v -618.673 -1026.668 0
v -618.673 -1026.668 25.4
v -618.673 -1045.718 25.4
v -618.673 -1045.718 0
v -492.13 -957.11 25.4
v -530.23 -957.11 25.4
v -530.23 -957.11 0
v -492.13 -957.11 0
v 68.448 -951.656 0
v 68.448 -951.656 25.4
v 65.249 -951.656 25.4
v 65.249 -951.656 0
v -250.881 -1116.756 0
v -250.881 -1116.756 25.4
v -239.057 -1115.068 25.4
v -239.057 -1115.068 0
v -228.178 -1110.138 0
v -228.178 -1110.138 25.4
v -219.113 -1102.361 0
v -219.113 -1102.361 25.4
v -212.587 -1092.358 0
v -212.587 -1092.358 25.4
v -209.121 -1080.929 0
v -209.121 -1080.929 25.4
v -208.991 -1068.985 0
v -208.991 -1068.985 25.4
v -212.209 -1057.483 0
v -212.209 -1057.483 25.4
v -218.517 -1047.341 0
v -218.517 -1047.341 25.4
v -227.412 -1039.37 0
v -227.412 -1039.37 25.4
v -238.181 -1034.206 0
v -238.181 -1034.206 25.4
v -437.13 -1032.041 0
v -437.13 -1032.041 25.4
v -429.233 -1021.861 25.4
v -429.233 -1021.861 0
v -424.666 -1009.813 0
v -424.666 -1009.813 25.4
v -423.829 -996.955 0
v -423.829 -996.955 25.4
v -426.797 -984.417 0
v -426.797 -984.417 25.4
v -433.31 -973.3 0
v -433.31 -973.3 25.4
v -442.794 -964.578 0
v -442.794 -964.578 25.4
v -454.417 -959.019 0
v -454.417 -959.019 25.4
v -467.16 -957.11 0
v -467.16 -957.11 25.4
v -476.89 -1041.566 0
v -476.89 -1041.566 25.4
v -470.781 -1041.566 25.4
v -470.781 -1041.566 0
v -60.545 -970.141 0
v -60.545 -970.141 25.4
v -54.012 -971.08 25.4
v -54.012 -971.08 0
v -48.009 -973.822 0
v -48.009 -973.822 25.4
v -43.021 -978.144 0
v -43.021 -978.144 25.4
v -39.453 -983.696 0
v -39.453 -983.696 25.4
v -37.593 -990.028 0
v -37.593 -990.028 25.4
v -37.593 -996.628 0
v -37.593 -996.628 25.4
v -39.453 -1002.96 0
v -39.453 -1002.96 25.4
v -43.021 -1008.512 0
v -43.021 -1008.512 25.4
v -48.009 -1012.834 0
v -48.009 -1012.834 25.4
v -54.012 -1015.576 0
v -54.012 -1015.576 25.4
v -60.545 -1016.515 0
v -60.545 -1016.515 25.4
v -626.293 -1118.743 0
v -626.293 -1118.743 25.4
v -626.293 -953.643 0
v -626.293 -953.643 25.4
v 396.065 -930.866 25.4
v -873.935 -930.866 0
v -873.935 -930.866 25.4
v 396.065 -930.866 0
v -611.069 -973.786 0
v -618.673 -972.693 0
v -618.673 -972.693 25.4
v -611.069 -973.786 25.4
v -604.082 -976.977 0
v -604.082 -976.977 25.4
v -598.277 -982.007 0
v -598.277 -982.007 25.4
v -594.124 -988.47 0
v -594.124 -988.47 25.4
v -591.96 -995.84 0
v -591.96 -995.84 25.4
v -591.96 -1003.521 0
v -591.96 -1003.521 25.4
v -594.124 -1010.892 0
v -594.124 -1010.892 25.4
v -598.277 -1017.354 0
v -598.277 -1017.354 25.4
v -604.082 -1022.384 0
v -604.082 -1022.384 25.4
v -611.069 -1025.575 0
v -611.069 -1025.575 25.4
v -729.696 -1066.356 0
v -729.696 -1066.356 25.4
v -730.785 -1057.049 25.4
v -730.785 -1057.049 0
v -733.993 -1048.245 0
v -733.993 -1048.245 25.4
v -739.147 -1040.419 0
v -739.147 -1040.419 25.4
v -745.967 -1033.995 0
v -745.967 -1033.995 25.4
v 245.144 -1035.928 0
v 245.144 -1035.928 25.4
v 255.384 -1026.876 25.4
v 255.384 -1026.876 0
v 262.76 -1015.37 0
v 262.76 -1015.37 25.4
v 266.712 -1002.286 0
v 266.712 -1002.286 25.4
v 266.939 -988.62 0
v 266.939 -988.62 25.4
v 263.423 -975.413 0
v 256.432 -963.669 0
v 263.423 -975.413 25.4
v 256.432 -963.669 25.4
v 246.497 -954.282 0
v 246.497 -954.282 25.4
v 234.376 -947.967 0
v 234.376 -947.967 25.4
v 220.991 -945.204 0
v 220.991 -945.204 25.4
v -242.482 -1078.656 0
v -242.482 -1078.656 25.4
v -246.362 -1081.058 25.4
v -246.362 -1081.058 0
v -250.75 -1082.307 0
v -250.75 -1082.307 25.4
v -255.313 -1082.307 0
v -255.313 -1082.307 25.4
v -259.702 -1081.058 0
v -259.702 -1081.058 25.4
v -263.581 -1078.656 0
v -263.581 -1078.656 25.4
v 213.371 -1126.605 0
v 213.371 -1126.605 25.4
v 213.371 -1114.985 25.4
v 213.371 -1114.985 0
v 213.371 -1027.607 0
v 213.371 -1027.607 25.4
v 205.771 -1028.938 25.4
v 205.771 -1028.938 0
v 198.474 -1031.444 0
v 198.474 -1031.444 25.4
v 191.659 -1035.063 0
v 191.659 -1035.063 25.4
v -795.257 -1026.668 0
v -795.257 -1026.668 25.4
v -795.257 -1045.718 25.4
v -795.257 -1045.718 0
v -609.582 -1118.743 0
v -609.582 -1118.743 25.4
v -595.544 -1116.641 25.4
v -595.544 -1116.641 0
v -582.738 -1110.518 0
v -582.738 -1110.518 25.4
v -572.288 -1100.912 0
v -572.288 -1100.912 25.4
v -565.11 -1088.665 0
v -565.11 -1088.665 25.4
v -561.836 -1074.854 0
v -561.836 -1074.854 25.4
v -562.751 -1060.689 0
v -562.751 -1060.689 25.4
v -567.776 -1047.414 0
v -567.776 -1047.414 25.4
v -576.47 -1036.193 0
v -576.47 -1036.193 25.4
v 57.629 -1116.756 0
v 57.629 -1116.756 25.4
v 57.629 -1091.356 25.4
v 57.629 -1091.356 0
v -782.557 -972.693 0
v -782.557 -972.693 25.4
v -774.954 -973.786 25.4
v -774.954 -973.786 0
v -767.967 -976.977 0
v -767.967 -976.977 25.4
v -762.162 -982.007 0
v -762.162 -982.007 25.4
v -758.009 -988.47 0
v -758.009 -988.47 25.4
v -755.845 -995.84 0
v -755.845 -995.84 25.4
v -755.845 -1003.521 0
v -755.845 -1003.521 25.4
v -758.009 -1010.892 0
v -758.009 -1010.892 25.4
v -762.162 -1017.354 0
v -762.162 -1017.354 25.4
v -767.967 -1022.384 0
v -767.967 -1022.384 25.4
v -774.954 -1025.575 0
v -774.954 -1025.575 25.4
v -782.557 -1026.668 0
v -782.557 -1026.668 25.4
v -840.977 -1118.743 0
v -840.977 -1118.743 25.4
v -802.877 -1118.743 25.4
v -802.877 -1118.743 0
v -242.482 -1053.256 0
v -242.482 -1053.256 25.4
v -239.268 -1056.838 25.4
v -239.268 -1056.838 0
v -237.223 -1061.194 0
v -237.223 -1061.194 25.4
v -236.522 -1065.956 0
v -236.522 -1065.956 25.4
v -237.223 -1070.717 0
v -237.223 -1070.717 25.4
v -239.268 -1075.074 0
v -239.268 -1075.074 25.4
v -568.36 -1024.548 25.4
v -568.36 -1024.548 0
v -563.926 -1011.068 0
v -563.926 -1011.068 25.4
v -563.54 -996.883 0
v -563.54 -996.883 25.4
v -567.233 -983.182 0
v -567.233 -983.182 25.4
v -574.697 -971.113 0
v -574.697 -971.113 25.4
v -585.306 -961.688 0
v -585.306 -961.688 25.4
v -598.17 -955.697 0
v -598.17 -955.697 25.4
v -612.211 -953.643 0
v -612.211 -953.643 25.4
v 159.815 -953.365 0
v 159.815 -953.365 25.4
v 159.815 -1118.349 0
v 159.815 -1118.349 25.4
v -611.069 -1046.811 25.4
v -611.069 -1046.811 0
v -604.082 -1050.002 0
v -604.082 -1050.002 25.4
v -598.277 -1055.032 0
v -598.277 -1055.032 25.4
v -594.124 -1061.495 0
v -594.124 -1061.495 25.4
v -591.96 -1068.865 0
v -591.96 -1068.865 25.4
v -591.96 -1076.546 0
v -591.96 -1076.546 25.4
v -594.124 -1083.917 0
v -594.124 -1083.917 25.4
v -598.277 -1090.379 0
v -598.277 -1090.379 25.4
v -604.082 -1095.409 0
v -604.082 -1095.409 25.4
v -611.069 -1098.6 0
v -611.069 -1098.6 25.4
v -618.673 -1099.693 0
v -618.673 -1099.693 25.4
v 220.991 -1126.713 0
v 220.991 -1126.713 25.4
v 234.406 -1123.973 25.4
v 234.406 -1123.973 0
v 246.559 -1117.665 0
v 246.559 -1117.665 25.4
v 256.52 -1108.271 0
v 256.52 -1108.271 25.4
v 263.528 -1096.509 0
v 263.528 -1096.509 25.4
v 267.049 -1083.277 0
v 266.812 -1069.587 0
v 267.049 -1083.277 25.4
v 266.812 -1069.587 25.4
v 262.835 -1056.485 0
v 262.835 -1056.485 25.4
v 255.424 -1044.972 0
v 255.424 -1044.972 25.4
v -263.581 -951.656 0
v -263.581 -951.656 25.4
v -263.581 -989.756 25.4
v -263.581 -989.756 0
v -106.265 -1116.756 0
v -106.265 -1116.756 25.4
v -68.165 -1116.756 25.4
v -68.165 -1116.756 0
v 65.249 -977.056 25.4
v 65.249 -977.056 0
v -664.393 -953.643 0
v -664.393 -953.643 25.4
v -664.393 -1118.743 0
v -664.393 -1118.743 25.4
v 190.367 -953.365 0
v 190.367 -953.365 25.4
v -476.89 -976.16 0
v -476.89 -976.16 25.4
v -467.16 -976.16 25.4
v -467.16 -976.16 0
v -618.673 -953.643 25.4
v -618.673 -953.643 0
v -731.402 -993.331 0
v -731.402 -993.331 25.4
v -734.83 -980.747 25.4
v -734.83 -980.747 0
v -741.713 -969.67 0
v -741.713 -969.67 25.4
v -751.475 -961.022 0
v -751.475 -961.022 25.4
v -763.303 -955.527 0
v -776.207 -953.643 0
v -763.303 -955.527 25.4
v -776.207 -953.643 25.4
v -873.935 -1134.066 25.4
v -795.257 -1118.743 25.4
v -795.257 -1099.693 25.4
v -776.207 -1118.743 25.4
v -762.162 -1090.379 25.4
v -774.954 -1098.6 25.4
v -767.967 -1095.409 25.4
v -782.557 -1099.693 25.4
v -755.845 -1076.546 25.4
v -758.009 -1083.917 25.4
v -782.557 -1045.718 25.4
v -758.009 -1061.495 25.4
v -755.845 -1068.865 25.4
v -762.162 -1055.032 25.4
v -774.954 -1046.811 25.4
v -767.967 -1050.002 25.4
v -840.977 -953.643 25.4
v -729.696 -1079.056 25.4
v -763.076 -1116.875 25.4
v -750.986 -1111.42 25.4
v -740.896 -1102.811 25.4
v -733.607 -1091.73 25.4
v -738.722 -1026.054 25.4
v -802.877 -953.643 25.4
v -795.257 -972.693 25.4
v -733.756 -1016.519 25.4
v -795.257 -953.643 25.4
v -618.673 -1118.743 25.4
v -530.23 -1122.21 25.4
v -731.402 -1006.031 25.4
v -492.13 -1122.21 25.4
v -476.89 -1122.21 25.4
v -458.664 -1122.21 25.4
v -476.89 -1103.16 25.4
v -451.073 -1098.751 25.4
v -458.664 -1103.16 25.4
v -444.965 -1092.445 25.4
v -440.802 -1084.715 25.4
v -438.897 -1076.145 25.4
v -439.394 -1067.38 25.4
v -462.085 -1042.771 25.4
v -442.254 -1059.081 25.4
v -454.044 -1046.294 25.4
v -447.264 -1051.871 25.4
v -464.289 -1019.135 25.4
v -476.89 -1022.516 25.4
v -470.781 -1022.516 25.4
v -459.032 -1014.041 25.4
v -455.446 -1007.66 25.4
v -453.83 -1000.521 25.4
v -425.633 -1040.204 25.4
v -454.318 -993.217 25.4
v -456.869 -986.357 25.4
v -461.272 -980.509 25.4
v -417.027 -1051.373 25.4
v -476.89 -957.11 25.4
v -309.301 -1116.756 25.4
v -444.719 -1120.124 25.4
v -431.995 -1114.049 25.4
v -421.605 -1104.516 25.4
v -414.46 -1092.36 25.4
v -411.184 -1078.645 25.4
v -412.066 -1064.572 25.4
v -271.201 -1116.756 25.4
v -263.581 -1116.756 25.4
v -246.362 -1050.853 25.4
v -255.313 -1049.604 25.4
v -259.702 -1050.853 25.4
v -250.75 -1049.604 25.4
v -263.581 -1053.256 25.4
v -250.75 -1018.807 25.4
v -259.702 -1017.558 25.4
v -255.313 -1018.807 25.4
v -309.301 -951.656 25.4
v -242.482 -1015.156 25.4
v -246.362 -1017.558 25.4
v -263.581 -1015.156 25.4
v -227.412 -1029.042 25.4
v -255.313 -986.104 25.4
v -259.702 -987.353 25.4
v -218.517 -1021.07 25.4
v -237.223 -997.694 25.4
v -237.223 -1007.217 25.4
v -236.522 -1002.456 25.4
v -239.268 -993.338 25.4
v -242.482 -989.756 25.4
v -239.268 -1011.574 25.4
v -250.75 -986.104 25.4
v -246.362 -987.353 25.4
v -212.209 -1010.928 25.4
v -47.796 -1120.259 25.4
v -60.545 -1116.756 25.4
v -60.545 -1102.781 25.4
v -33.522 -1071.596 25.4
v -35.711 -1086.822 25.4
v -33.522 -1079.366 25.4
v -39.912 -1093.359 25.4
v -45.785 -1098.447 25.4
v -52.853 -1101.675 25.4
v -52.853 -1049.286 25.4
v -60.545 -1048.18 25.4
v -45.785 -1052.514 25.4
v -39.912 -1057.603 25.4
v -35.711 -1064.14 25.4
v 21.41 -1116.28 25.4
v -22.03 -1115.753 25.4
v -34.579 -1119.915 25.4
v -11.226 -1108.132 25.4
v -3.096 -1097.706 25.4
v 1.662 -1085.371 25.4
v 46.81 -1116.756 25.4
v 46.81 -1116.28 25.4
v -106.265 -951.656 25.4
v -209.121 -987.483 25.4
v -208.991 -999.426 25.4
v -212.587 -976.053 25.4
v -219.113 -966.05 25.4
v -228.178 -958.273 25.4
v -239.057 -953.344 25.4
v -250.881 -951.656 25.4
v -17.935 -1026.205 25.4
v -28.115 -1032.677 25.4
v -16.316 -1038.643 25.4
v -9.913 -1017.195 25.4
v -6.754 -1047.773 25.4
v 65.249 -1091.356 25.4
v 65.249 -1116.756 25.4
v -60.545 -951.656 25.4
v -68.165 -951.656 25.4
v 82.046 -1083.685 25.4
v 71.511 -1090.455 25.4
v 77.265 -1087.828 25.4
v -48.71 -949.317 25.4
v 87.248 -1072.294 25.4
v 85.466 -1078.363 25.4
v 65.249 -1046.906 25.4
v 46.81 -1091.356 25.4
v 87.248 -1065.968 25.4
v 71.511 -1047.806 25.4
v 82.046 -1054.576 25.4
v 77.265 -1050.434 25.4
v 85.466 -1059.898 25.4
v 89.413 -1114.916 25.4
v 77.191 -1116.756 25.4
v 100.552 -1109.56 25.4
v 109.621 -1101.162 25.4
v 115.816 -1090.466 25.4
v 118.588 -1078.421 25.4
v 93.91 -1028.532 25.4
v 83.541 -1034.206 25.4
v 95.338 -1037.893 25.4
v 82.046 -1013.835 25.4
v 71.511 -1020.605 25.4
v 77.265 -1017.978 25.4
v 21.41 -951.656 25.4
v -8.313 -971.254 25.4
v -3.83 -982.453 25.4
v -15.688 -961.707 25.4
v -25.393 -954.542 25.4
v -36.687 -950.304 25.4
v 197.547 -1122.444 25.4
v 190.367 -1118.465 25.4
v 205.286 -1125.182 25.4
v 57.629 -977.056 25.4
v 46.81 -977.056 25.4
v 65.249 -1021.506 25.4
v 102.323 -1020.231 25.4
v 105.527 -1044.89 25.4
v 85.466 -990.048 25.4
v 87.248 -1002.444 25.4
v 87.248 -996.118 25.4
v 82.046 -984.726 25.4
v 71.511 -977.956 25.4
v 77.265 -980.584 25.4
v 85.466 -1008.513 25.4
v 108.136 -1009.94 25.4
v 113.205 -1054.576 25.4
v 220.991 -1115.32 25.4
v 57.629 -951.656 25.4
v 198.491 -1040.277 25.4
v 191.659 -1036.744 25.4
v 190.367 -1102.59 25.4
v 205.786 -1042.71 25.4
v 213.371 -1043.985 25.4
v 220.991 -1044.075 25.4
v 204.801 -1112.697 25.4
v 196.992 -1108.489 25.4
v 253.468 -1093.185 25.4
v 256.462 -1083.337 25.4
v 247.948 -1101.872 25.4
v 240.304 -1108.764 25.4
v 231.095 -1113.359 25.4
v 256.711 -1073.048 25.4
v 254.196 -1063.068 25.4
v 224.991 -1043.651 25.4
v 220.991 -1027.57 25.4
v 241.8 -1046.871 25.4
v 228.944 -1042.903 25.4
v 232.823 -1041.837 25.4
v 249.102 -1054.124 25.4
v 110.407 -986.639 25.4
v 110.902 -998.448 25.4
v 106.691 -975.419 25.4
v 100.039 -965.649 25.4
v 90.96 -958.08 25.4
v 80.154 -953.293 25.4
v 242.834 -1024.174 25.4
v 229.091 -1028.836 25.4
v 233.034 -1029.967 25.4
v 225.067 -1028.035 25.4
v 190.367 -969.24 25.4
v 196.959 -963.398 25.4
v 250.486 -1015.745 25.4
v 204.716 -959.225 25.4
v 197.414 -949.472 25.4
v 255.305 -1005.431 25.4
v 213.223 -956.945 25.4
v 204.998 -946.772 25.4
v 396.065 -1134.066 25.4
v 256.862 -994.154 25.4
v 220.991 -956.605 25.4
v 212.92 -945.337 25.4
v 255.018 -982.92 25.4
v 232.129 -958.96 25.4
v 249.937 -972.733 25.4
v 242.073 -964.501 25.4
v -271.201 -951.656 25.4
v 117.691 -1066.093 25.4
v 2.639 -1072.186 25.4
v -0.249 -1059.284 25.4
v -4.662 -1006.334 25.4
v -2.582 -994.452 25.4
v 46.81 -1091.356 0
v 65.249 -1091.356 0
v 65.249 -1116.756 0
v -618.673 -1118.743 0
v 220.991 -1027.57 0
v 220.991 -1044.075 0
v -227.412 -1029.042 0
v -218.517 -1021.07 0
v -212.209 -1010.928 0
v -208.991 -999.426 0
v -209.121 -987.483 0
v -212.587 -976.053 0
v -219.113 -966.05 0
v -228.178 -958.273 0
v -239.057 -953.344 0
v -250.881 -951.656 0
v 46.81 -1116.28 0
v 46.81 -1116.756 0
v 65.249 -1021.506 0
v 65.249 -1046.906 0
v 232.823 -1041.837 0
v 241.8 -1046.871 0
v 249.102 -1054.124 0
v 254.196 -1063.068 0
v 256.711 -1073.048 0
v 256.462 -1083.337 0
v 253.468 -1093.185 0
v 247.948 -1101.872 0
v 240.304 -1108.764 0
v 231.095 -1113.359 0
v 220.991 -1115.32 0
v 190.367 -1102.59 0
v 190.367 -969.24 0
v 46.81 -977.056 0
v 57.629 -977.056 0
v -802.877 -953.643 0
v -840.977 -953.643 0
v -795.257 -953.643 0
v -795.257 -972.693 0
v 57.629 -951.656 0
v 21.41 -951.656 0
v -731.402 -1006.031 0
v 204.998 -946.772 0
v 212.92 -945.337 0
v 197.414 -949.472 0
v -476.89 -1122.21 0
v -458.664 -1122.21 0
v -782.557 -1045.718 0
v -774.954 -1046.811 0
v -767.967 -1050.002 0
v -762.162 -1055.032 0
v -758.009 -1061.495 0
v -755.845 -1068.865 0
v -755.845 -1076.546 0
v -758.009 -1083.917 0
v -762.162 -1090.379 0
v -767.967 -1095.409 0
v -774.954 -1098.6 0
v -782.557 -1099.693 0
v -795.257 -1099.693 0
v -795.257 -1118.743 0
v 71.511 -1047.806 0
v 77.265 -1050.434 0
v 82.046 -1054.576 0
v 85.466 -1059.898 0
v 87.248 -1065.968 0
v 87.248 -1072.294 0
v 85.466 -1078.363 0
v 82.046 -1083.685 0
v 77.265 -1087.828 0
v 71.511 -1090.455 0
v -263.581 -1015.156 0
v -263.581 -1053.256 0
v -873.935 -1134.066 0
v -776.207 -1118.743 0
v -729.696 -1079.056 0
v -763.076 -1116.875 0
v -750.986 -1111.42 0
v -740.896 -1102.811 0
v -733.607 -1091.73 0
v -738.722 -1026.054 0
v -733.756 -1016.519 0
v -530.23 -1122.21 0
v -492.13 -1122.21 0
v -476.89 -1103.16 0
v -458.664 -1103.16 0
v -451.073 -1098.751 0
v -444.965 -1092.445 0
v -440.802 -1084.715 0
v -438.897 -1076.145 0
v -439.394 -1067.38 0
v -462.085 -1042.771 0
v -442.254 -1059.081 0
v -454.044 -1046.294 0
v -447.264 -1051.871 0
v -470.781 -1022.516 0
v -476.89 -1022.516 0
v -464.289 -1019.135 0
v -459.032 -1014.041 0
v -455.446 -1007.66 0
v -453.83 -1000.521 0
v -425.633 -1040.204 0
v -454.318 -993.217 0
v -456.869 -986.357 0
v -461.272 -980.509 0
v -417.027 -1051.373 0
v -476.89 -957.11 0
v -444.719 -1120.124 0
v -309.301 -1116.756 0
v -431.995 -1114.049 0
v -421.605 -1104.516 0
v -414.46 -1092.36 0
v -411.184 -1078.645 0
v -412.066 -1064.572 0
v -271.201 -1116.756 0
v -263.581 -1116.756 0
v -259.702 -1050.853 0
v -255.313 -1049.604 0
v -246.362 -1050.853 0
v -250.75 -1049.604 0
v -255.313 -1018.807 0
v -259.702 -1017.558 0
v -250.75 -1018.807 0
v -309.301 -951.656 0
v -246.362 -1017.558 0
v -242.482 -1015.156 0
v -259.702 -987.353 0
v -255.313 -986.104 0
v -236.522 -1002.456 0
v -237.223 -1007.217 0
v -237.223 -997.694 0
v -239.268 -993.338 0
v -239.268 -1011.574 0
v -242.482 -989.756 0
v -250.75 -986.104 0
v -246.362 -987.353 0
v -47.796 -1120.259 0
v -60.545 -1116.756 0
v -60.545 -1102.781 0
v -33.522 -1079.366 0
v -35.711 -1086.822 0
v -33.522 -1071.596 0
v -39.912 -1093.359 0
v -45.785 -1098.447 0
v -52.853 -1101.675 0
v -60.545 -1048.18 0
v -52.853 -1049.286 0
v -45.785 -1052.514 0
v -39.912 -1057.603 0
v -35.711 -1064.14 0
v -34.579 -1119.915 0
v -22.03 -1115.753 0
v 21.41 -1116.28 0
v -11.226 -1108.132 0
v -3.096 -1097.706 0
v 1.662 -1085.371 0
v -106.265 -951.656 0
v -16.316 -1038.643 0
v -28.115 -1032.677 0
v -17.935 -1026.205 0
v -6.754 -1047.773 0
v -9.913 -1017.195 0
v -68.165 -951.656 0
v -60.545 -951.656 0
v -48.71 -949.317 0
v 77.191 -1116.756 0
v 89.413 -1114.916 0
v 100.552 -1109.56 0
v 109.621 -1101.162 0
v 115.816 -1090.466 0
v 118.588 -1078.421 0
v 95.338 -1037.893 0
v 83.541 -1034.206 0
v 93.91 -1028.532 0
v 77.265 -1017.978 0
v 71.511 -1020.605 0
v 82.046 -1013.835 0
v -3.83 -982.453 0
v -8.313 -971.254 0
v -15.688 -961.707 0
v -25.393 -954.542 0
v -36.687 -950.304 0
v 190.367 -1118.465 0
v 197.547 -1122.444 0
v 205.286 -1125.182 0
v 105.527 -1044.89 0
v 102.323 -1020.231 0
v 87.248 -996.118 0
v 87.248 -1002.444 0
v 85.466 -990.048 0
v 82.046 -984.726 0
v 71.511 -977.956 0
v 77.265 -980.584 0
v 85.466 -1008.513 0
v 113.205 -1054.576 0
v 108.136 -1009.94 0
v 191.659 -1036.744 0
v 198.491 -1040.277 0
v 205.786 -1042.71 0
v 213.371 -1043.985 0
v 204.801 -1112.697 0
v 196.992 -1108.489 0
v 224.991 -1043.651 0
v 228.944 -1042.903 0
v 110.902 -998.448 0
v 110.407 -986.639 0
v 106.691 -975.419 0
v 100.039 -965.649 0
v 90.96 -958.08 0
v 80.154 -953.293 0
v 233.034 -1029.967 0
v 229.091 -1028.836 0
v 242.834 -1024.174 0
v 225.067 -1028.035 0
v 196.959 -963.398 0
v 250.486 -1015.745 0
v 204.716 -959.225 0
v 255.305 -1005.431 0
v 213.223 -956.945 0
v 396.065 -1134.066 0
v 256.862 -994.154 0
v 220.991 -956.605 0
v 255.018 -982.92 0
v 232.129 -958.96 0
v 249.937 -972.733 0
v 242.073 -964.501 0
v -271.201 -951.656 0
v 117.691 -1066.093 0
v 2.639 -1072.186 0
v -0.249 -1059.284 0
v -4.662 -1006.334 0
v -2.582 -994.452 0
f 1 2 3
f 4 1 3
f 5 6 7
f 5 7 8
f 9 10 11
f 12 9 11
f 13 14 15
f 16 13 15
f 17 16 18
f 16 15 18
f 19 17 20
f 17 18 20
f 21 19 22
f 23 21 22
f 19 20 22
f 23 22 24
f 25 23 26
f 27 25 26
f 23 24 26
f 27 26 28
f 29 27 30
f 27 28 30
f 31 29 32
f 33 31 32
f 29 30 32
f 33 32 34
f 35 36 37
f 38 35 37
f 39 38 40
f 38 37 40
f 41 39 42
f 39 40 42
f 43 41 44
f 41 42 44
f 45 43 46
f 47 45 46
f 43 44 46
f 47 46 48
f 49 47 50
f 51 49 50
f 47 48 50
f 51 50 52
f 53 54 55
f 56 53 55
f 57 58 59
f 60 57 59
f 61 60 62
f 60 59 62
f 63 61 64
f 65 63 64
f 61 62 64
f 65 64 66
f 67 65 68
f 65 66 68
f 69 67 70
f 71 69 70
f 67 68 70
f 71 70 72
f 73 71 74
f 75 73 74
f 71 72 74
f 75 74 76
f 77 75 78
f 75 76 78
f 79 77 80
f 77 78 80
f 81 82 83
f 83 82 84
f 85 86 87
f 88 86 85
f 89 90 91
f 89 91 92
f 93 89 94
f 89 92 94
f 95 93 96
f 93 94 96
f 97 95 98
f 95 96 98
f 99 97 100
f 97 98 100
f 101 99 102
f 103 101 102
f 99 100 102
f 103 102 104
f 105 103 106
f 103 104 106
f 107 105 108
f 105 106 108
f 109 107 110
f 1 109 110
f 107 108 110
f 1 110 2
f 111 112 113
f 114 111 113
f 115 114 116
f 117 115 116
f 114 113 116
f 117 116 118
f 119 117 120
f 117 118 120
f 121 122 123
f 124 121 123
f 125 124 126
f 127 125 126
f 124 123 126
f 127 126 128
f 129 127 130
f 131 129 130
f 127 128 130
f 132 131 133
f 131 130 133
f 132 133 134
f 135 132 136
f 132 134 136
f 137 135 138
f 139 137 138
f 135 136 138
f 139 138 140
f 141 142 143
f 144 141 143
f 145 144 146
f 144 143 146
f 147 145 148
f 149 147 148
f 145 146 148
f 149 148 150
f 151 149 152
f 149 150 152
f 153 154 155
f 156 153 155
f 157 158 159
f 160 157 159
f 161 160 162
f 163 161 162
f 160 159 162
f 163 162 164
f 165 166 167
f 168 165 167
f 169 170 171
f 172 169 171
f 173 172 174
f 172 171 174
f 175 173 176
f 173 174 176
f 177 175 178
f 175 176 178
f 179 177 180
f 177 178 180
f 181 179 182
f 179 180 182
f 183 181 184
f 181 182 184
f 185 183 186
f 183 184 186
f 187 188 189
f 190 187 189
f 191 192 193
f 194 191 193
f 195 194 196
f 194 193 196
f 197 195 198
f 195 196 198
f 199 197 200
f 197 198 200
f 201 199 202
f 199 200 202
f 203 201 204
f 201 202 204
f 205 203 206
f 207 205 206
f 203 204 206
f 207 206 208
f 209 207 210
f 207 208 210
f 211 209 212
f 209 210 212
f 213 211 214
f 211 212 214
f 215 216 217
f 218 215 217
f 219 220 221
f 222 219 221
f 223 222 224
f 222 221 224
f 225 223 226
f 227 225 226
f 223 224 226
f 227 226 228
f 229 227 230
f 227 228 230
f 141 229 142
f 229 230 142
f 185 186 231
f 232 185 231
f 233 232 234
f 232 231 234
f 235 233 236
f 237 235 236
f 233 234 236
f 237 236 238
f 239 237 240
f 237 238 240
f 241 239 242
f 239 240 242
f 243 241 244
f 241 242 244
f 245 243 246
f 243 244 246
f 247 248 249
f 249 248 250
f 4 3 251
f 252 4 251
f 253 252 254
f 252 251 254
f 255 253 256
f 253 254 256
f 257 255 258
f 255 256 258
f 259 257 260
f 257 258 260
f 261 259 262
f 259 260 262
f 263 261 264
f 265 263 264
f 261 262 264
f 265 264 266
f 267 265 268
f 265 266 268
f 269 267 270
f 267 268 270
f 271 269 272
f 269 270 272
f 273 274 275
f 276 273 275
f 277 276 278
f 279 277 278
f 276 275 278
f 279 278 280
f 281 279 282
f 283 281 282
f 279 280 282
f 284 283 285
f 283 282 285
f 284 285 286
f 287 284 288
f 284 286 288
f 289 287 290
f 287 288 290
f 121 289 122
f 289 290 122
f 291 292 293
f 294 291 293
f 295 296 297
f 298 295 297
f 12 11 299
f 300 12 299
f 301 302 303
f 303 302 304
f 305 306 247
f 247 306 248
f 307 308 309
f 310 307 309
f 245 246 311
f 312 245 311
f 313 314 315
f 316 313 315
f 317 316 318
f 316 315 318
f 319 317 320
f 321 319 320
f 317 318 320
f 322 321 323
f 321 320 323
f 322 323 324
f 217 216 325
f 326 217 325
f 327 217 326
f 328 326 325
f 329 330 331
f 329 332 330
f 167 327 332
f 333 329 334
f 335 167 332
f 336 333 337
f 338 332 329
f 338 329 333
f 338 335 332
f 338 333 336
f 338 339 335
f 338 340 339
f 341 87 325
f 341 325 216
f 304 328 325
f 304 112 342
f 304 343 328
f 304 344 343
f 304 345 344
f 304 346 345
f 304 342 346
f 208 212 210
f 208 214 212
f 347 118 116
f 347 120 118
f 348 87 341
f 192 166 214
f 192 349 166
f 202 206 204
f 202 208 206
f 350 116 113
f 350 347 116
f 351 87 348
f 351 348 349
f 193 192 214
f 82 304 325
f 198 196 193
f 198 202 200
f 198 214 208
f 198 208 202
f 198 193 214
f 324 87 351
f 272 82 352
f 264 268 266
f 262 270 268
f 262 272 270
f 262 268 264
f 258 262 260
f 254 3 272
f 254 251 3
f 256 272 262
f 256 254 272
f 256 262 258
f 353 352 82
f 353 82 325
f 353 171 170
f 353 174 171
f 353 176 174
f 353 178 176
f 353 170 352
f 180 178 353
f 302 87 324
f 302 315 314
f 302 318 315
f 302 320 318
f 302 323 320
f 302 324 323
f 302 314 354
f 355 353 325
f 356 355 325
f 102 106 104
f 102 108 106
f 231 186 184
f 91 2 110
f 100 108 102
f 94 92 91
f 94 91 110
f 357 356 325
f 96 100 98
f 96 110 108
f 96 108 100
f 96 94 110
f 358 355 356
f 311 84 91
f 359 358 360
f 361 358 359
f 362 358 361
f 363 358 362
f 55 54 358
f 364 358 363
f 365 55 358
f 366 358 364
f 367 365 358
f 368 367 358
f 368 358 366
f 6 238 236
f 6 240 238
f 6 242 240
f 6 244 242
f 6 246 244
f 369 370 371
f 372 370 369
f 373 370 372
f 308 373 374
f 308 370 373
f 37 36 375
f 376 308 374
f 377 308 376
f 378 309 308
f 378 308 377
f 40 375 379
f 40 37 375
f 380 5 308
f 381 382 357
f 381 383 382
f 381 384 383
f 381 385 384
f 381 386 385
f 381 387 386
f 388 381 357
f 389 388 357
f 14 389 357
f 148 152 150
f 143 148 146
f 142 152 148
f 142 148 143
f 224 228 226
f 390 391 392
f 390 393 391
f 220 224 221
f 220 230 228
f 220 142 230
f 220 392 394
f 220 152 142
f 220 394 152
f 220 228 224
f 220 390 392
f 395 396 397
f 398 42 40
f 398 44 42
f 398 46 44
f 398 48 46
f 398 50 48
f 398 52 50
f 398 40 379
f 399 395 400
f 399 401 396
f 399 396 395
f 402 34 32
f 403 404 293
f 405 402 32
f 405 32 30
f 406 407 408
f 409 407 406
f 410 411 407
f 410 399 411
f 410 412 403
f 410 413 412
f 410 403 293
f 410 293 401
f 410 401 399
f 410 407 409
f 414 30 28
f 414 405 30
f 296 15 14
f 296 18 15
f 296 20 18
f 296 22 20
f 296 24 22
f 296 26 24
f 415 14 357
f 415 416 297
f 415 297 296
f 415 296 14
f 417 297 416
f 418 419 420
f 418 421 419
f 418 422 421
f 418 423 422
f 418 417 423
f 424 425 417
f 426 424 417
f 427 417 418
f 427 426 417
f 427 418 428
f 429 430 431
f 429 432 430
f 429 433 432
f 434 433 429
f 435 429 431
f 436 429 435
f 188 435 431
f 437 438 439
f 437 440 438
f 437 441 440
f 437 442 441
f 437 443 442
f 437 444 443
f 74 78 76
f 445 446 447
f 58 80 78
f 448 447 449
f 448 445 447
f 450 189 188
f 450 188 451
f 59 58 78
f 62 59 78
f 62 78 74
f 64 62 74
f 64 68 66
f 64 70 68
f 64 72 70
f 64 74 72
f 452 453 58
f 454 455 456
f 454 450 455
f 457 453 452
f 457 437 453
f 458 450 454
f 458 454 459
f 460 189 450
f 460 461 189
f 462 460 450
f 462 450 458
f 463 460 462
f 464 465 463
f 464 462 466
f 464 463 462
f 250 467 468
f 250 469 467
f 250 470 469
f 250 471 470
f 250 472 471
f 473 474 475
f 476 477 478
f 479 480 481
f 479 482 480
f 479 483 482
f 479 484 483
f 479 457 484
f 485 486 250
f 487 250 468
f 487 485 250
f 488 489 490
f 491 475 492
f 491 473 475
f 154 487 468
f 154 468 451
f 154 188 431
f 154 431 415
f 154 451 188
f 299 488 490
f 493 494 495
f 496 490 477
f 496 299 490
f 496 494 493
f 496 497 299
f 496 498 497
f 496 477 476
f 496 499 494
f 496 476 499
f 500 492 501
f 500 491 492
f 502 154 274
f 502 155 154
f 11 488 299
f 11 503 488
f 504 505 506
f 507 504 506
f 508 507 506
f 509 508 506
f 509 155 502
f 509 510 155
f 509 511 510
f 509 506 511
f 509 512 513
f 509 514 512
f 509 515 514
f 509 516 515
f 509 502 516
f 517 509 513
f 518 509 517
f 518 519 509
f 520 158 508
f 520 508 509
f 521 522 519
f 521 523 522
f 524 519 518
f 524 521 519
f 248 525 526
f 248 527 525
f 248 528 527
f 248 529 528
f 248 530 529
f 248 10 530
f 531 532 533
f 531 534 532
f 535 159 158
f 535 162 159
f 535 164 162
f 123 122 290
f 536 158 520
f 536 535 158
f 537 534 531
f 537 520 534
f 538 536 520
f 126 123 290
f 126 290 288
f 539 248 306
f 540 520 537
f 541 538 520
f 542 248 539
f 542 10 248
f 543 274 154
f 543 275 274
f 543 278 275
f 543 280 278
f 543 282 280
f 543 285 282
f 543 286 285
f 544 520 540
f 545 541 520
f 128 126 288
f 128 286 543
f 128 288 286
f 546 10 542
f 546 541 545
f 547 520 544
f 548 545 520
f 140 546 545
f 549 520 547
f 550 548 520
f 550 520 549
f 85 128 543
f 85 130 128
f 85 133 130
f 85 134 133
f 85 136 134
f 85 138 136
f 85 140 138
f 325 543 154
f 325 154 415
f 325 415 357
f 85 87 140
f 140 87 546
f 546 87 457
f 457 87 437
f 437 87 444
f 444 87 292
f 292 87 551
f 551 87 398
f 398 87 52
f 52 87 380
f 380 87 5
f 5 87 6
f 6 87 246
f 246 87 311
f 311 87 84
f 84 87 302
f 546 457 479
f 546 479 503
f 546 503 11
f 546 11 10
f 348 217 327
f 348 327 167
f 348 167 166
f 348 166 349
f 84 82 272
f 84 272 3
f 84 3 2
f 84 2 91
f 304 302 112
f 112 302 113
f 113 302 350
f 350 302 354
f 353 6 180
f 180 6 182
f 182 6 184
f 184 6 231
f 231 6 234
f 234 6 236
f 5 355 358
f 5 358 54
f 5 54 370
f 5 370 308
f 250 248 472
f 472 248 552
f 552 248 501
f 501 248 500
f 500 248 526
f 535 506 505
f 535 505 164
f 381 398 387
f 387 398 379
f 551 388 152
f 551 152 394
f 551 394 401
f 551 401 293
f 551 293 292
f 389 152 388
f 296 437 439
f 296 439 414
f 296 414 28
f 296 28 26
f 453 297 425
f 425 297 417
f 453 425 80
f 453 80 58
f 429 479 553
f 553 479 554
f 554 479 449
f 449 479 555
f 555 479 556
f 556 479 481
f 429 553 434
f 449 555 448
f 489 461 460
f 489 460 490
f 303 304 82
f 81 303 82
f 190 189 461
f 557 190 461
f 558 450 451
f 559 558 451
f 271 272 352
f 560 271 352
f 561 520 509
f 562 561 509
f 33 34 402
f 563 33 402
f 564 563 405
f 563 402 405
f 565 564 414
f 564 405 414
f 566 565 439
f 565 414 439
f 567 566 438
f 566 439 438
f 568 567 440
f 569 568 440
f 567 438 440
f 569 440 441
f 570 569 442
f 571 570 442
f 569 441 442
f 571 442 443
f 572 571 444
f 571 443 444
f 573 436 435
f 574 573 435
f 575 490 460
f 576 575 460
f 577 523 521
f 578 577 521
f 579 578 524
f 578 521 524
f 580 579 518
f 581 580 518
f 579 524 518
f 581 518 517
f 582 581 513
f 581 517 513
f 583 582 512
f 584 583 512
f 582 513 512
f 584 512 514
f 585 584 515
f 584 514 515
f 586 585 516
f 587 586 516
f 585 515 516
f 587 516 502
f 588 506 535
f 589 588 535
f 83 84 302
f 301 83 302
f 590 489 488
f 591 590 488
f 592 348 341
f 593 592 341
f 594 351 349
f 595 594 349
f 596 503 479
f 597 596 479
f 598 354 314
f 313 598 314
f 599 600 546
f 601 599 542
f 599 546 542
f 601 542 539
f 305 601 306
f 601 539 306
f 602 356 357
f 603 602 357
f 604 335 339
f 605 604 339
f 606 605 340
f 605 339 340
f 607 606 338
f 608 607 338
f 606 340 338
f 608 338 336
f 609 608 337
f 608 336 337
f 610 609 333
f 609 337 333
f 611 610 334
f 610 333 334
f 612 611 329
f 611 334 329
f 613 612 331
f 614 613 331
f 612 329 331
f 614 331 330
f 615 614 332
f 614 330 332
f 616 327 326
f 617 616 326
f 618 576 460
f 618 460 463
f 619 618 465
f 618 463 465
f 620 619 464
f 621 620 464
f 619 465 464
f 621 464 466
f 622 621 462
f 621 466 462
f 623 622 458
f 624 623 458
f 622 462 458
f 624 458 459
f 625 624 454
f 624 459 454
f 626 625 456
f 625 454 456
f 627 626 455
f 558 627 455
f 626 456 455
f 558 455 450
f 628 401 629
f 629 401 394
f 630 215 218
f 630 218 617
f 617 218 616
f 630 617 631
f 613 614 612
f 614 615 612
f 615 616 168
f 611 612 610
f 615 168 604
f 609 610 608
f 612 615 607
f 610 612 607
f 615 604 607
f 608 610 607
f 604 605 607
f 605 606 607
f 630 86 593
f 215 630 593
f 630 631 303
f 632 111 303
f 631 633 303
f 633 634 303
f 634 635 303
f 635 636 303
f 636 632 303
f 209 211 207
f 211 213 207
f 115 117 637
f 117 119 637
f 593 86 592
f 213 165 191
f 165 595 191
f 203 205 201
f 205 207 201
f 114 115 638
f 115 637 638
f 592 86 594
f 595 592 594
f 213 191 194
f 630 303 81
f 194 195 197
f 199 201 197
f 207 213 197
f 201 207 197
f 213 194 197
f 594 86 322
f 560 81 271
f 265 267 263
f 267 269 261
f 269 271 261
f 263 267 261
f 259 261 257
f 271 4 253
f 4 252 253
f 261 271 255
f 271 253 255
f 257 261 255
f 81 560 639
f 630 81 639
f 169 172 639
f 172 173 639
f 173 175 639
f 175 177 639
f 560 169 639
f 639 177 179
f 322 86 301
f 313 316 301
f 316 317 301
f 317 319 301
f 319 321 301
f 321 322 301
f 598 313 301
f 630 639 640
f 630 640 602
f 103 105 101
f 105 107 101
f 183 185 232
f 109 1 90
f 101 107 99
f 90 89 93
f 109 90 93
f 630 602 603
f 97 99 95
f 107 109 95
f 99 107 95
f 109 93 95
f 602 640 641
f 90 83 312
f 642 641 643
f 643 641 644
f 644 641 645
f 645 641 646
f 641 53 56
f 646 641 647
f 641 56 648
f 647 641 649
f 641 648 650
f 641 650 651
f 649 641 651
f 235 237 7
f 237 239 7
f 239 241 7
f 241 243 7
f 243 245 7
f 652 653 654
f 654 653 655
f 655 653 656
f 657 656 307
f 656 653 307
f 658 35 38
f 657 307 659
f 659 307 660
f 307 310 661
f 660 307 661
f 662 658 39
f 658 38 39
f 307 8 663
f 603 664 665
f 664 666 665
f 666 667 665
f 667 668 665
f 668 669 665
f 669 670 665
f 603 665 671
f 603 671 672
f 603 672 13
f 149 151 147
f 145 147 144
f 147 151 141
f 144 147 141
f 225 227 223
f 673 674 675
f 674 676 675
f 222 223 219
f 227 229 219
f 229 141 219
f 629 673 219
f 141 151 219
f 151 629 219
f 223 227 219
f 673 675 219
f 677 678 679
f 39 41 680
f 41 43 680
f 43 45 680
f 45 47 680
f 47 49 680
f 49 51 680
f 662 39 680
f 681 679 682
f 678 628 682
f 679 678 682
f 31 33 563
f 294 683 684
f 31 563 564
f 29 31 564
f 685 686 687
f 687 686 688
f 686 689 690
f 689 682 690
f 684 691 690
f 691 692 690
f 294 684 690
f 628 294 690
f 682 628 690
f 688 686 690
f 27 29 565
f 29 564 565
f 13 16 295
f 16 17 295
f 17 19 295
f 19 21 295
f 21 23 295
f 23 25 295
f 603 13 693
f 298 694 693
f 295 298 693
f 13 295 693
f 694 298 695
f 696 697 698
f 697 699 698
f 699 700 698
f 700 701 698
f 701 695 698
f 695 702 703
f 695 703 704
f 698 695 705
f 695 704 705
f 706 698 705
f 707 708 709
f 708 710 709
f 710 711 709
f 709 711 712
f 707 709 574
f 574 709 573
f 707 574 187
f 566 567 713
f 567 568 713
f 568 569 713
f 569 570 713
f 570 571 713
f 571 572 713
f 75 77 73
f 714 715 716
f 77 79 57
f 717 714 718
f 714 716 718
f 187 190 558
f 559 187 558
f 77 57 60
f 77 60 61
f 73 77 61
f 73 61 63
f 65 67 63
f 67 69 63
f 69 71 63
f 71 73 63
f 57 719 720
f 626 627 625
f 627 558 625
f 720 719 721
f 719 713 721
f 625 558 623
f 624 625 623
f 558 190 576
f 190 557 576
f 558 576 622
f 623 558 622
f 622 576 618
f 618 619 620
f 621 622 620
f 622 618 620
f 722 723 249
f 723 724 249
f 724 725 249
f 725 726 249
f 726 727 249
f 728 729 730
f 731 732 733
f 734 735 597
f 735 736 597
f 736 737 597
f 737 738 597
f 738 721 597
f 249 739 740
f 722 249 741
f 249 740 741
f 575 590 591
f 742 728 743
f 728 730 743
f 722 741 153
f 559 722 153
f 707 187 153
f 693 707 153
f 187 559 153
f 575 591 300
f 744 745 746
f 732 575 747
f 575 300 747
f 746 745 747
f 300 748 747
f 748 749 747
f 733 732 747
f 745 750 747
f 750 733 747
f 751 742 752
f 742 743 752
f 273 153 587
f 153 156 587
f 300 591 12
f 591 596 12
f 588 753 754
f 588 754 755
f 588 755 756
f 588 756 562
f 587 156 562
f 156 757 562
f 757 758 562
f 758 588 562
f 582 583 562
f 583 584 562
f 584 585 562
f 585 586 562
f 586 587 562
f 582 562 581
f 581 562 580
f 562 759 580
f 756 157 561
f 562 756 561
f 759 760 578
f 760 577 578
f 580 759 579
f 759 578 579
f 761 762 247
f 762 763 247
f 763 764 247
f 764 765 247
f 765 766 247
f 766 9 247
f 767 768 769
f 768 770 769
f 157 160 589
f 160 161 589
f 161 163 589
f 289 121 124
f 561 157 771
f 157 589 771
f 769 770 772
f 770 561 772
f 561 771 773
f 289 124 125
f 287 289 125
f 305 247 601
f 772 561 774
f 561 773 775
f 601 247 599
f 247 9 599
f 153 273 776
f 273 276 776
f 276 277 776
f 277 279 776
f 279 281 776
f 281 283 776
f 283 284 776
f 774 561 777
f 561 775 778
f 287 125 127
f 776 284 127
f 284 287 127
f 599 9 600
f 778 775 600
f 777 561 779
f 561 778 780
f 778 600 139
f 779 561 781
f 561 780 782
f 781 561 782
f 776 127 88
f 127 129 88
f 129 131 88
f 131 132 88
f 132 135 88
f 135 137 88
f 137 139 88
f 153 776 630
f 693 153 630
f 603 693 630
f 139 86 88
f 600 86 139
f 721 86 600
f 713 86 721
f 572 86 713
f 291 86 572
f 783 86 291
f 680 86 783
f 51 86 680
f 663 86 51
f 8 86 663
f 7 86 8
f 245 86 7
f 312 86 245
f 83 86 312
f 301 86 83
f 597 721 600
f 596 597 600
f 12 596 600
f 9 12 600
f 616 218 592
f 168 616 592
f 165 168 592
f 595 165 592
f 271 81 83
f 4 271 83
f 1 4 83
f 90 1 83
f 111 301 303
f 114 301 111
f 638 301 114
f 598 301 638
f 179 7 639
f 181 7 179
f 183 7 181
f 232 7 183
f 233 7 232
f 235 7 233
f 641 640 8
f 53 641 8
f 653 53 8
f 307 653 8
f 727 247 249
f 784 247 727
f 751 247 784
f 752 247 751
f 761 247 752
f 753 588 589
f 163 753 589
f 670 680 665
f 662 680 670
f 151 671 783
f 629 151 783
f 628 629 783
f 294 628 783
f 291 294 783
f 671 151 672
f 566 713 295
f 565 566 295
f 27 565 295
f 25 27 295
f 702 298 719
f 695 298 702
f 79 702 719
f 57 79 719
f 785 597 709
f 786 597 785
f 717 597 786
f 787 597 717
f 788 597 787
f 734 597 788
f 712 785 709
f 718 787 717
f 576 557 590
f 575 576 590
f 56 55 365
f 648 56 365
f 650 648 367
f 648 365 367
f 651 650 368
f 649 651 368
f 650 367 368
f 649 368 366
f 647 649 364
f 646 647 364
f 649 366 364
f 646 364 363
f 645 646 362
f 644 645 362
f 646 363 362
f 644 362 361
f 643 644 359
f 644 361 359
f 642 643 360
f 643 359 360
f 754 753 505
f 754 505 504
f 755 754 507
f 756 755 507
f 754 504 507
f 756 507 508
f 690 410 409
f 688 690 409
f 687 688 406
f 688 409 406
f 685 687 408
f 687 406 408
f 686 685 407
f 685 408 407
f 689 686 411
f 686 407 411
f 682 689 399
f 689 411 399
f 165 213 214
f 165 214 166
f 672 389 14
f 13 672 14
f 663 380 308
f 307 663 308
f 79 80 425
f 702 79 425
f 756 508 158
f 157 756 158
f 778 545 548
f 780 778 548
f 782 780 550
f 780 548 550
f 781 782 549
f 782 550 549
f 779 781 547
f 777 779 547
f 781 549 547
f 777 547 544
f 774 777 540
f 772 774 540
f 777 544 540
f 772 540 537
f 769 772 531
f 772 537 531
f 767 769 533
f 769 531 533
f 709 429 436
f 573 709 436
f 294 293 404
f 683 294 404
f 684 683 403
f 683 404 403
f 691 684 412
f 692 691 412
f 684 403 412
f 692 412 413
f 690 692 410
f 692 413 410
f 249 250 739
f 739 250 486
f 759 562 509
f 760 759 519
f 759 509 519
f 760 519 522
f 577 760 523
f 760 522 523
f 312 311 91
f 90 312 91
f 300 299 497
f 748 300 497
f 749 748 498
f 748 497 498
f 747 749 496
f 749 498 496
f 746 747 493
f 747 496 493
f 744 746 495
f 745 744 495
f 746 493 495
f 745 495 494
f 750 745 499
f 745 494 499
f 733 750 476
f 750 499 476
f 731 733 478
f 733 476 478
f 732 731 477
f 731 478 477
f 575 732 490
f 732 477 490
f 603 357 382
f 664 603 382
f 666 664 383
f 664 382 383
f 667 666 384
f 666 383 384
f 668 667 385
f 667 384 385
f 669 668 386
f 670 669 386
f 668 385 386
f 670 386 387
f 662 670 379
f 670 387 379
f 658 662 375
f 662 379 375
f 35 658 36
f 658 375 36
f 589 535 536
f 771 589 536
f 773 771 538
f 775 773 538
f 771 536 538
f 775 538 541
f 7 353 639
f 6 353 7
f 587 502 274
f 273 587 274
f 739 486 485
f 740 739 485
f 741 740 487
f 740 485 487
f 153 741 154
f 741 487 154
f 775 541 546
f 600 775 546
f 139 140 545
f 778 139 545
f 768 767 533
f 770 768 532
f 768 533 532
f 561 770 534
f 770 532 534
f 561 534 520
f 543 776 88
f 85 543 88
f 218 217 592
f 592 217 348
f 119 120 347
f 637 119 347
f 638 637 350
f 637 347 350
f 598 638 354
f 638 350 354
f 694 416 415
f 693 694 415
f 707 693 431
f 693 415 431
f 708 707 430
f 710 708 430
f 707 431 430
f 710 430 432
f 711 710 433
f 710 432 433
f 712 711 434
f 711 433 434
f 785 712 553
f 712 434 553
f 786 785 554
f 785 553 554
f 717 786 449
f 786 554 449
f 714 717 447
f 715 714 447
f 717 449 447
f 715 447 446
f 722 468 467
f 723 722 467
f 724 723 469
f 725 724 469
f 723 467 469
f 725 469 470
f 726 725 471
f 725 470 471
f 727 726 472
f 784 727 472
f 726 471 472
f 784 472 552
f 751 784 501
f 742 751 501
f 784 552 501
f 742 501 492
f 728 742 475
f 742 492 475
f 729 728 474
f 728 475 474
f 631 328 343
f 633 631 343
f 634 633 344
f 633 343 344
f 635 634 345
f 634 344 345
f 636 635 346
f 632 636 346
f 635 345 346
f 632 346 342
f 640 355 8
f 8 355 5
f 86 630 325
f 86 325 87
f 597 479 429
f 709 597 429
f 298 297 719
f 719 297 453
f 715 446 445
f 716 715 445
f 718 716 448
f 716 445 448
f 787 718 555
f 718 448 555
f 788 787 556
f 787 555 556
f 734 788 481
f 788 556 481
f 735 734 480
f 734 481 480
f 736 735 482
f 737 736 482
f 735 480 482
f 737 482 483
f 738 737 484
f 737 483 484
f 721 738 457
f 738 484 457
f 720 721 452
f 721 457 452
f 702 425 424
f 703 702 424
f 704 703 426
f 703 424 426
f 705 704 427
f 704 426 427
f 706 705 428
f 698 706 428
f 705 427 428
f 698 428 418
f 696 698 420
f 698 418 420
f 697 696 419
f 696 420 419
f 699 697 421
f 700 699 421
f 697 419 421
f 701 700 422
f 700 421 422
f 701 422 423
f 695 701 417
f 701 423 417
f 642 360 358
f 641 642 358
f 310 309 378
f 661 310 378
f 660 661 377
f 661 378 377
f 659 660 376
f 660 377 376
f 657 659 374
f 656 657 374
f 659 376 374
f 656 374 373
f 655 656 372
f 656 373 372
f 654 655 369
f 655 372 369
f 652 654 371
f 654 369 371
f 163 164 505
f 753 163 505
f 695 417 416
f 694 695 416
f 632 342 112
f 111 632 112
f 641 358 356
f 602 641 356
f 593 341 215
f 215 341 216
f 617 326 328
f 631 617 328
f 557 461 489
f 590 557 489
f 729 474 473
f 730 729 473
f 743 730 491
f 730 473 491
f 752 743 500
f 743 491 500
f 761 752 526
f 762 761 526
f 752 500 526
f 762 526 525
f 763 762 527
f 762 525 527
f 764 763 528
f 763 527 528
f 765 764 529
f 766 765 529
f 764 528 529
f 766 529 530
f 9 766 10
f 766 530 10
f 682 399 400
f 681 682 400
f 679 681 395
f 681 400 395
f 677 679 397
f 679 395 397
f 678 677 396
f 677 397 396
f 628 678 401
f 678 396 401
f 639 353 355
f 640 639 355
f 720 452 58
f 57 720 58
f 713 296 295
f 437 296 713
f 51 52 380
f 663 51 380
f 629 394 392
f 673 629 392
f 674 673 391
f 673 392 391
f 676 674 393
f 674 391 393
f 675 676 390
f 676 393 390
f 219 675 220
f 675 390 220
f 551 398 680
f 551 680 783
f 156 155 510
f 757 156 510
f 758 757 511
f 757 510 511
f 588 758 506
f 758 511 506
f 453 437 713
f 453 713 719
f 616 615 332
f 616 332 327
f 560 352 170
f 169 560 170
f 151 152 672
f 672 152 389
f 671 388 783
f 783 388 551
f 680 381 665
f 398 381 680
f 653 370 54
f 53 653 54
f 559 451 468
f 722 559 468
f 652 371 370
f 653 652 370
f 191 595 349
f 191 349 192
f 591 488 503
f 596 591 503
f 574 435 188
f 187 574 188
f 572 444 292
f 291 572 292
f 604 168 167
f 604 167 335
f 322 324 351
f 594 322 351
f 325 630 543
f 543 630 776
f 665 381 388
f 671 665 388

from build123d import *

# Parameters (mm, degrees)
F0_W      = 1270
F0_H      = 203.2
F1_DEPTH  = 25.4
F3_DEPTH  = 25.4
F5_DEPTH  = 25.4
F6_W      = 38.1
F6_H      = 165.1
F7_DEPTH  = 25.4
F8_W      = 38.1
F8_H      = 165.1
F9_DEPTH  = 25.4
F10_W     = 38.1
F10_H     = 165.1
F11_DEPTH = 25.4
F12_W     = 10.8188445342
F12_H     = 25.4
F13_DEPTH = 25.4
F15_DEPTH = 25.4


# Not quite as in the source:
# - a feature names something its author has since deleted; it is built from what else it names


with BuildPart() as f1:
    # F0 (on Top) → F1 (new body)
    with BuildSketch(Plane.XY):
        with Locations((-238.9351708174, -1032.4661802616)):
            Rectangle(F0_W, F0_H)
    extrude(amount=F1_DEPTH)

    # F2 (on face) → F3 (cut)
    with BuildSketch(Plane.XY.offset(25.4)):
        Polygon((-802.8773658486, -953.6430131912), (-840.9773658486, -953.6430131912), (-840.9773658486, -1118.7430131912), (-802.8773658486, -1118.7430131912), (-802.8773658486, -1036.1930131912), align=None)
        with BuildLine():
            Line((-795.2573658486, -1026.6680131912), (-795.2573658486, -1034.9226884847))
            ThreePointArc((-795.2573658486, -1034.9226884847), (-770.7707510059, -1026.0470401418), (-745.9674756926, -1033.9949312892))
            ThreePointArc((-745.9674756926, -1033.9949312892), (-735.9296714012, -1021.4477610393), (-731.4022587776, -1006.0305131912))
            Line((-731.4022587776, -1006.0305131912), (-731.4022587776, -993.3305131912))
            ThreePointArc((-731.4022587776, -993.3305131912), (-746.2799733966, -964.9916145085), (-776.2073658486, -953.6430131912))
            Line((-776.2073658486, -953.6430131912), (-795.2573658486, -953.6430131912))
            Line((-795.2573658486, -953.6430131912), (-795.2573658486, -972.6930131912))
            Line((-795.2573658486, -972.6930131912), (-782.5573658486, -972.6930131912))
            ThreePointArc((-782.5573658486, -972.6930131912), (-755.5698658486, -999.6805131912), (-782.5573658486, -1026.6680131912))
            Line((-782.5573658486, -1026.6680131912), (-795.2573658486, -1026.6680131912))
        make_face()
        with BuildLine():
            ThreePointArc((-745.9674756926, -1033.9949312892), (-770.0833121416, -1043.7192190255), (-795.2573658486, -1037.2075096056))
            Line((-795.2573658486, -1037.2075096056), (-795.2573658486, -1045.7180131912))
            Line((-795.2573658486, -1045.7180131912), (-782.5573658486, -1045.7180131912))
            ThreePointArc((-782.5573658486, -1045.7180131912), (-755.5698658486, -1072.7055131912), (-782.5573658486, -1099.6930131912))
            Line((-782.5573658486, -1099.6930131912), (-795.2573658486, -1099.6930131912))
            Line((-795.2573658486, -1099.6930131912), (-795.2573658486, -1118.7430131912))
            Line((-795.2573658486, -1118.7430131912), (-776.2073658486, -1118.7430131912))
            ThreePointArc((-776.2073658486, -1118.7430131912), (-745.6362827432, -1107.4726468348), (-729.6964334488, -1079.0555131912))
            Line((-729.6964334488, -1079.0555131912), (-729.6964334488, -1066.3555131912))
            ThreePointArc((-729.6964334488, -1066.3555131912), (-733.9931607032, -1048.2450598787), (-745.9674756926, -1033.9949312892))
        make_face()
        with BuildLine():
            Line((-795.2573658486, -1034.9226884847), (-795.2573658486, -1036.1930131912))
            Line((-795.2573658486, -1036.1930131912), (-795.2573658486, -1037.2075096056))
            ThreePointArc((-795.2573658486, -1037.2075096056), (-770.0833121416, -1043.7192190255), (-745.9674756926, -1033.9949312892))
            ThreePointArc((-745.9674756926, -1033.9949312892), (-770.7707510059, -1026.0470401418), (-795.2573658486, -1034.9226884847))
        make_face()
    extrude(amount=-F3_DEPTH, mode=Mode.SUBTRACT)

    # F4 (on face) → F5 (cut)
    with BuildSketch(Plane.XY.offset(25.4)):
        Polygon((-626.2925520338, -953.6430131912), (-664.3925520338, -953.6430131912), (-664.3925520338, -1118.7430131912), (-626.2925520338, -1118.7430131912), (-626.2925520338, -1036.1930131912), align=None)
        with BuildLine():
            Line((-618.6725520338, -1026.6680131912), (-618.6725520338, -1036.1930131912))
            Line((-618.6725520338, -1036.1930131912), (-576.4699598814, -1036.1930131912))
            ThreePointArc((-576.4699598814, -1036.1930131912), (-567.2333827461, -983.181698655), (-612.2109314466, -953.6430131912))
            Line((-612.2109314466, -953.6430131912), (-618.6725520338, -953.6430131912))
            Line((-618.6725520338, -953.6430131912), (-618.6725520338, -972.6930131912))
            ThreePointArc((-618.6725520338, -972.6930131912), (-591.6850520338, -999.6805131912), (-618.6725520338, -1026.6680131912))
        make_face()
        with BuildLine():
            Line((-576.4699598814, -1036.1930131912), (-618.6725520338, -1036.1930131912))
            Line((-618.6725520338, -1036.1930131912), (-618.6725520338, -1045.7180131912))
            ThreePointArc((-618.6725520338, -1045.7180131912), (-591.6850520338, -1072.7055131912), (-618.6725520338, -1099.6930131912))
            Line((-618.6725520338, -1099.6930131912), (-618.6725520338, -1118.7430131912))
            Line((-618.6725520338, -1118.7430131912), (-609.5818281174, -1118.7430131912))
            ThreePointArc((-609.5818281174, -1118.7430131912), (-565.110212681, -1088.6653525193), (-576.4699598814, -1036.1930131912))
        make_face()
    extrude(amount=-F5_DEPTH, mode=Mode.SUBTRACT)

    # F6 (on face) → F7 (cut)
    with BuildSketch(Plane.XY.offset(25.4)):
        with Locations((-290.2511896121, -1034.2057645321)):
            Rectangle(F6_W, F6_H)
        with BuildLine():
            Line((-250.8811896121, -951.6557645321), (-263.5811896121, -951.6557645321))
            Line((-263.5811896121, -951.6557645321), (-263.5811896121, -989.7557645321))
            ThreePointArc((-263.5811896121, -989.7557645321), (-253.0317773062, -985.9457645321), (-242.4823650003, -989.7557645321))
            ThreePointArc((-242.4823650003, -989.7557645321), (-236.5217773062, -1002.4557645321), (-242.4823650003, -1015.1557645321))
            ThreePointArc((-242.4823650003, -1015.1557645321), (-253.0317773062, -1018.9657645321), (-263.5811896121, -1015.1557645321))
            Line((-263.5811896121, -1015.1557645321), (-263.5811896121, -1034.2057645321))
            Line((-263.5811896121, -1034.2057645321), (-238.1811896121, -1034.2057645321))
            ThreePointArc((-238.1811896121, -1034.2057645321), (-209.1205846715, -987.4829791566), (-250.8811896121, -951.6557645321))
        make_face()
        with BuildLine():
            ThreePointArc((-250.8811896121, -1116.7557645321), (-209.1205846715, -1080.9285499076), (-238.1811896121, -1034.2057645321))
            Line((-238.1811896121, -1034.2057645321), (-263.5811896121, -1034.2057645321))
            Line((-263.5811896121, -1034.2057645321), (-263.5811896121, -1053.2557645321))
            ThreePointArc((-263.5811896121, -1053.2557645321), (-253.0317773062, -1049.4457645321), (-242.4823650003, -1053.2557645321))
            ThreePointArc((-242.4823650003, -1053.2557645321), (-236.5217773062, -1065.9557645321), (-242.4823650003, -1078.6557645321))
            ThreePointArc((-242.4823650003, -1078.6557645321), (-253.0317773062, -1082.4657645321), (-263.5811896121, -1078.6557645321))
            Line((-263.5811896121, -1078.6557645321), (-263.5811896121, -1116.7557645321))
            Line((-263.5811896121, -1116.7557645321), (-250.8811896121, -1116.7557645321))
        make_face()
    extrude(amount=-F7_DEPTH, mode=Mode.SUBTRACT)

    # F8 (on face) → F9 (cut)
    with BuildSketch(Plane.XY.offset(25.4)):
        with Locations((-511.1800421023, -1039.6600419521)):
            Rectangle(F8_W, F8_H)
        with BuildLine():
            Line((-476.8900421023, -1103.1600419521), (-476.8900421023, -1122.2100419521))
            Line((-476.8900421023, -1122.2100419521), (-458.6642896088, -1122.2100419521))
            ThreePointArc((-458.6642896088, -1122.2100419521), (-412.3120735256, -1085.6240501252), (-437.1304200925, -1032.0412879019))
            ThreePointArc((-437.1304200925, -1032.0412879019), (-426.7974991694, -984.4173911629), (-467.1597770349, -957.1100419521))
            Line((-467.1597770349, -957.1100419521), (-476.8900421023, -957.1100419521))
            Line((-476.8900421023, -957.1100419521), (-476.8900421023, -976.1600419521))
            Line((-476.8900421023, -976.1600419521), (-467.1597770349, -976.1600419521))
            ThreePointArc((-467.1597770349, -976.1600419521), (-453.8301047521, -1000.5208961567), (-470.7810375499, -1022.5162879019))
            Line((-470.7810375499, -1022.5162879019), (-476.8900421023, -1022.5162879019))
            Line((-476.8900421023, -1022.5162879019), (-476.8900421023, -1041.5662879019))
            Line((-476.8900421023, -1041.5662879019), (-470.7810375499, -1041.5662879019))
            ThreePointArc((-470.7810375499, -1041.5662879019), (-439.3939139214, -1067.38048316), (-458.6642896088, -1103.1600419521))
            Line((-458.6642896088, -1103.1600419521), (-476.8900421023, -1103.1600419521))
        make_face()
    extrude(amount=-F9_DEPTH, mode=Mode.SUBTRACT)

    # F10 (on face) → F11 (cut)
    with BuildSketch(Plane.XY.offset(25.4)):
        with BuildLine():
            ThreePointArc((-28.1148758721, -1032.6774345846), (-5.6831499313, -976.6978639922), (-60.5446838784, -951.6557645321))
            Line((-60.5446838784, -951.6557645321), (-60.5446838784, -970.1407297723))
            ThreePointArc((-60.5446838784, -970.1407297723), (-37.3573787729, -993.3280348778), (-60.5446838784, -1016.5153399833))
            Line((-60.5446838784, -1016.5153399833), (-60.5446838784, -1048.1804596051))
            ThreePointArc((-60.5446838784, -1048.1804596051), (-33.2443789514, -1075.4807645321), (-60.5446838784, -1102.7810694591))
            Line((-60.5446838784, -1102.7810694591), (-60.5446838784, -1116.7557645321))
            ThreePointArc((-60.5446838784, -1116.7557645321), (-0.2627634404, -1091.713665072), (-28.1148758721, -1032.6774345846))
        make_face()
        with Locations((-87.2146838784, -1034.2057645321)):
            Rectangle(F10_W, F10_H)
    extrude(amount=-F11_DEPTH, mode=Mode.SUBTRACT)

    # F12 (on face) → F13 (cut)
    with BuildSketch(Plane.XY.offset(25.4)):
        Polygon((46.8103381641, -977.0557645321), (46.8103381641, -951.6557645321), (21.4103381641, -951.6557645321), (21.4103381641, -1116.2804365158), (46.8103381641, -1116.2804365158), (46.8103381641, -1091.3557645321), (46.8103381641, -1046.9057645321), (46.8103381641, -1034.2057645321), (46.8103381641, -1021.5057645321), align=None)
        with Locations((52.2197604311, -964.3557645321)):
            Rectangle(F12_W, F12_H)
        Polygon((46.8103381641, -1091.3557645321), (46.8103381641, -1116.2804365158), (46.8103381641, -1116.7557645321), (57.6291826982, -1116.7557645321), (57.6291826982, -1091.3557645321), align=None)
        with BuildLine():
            ThreePointArc((65.2491826982, -977.0557645321), (87.4741826982, -999.2807645321), (65.2491826982, -1021.5057645321))
            Line((65.2491826982, -1021.5057645321), (65.2491826982, -1034.2057645321))
            Line((65.2491826982, -1034.2057645321), (83.540642596, -1034.2057645321))
            ThreePointArc((83.540642596, -1034.2057645321), (110.4072024463, -986.6390604349), (68.4480272324, -951.6557645321))
            Line((68.4480272324, -951.6557645321), (65.2491826982, -951.6557645321))
            Line((65.2491826982, -951.6557645321), (65.2491826982, -977.0557645321))
        make_face()
        with BuildLine():
            Line((83.540642596, -1034.2057645321), (65.2491826982, -1034.2057645321))
            Line((65.2491826982, -1034.2057645321), (65.2491826982, -1046.9057645321))
            ThreePointArc((65.2491826982, -1046.9057645321), (87.4741826982, -1069.1307645321), (65.2491826982, -1091.3557645321))
            Line((65.2491826982, -1091.3557645321), (65.2491826982, -1116.7557645321))
            Line((65.2491826982, -1116.7557645321), (77.190642596, -1116.7557645321))
            ThreePointArc((77.190642596, -1116.7557645321), (118.587577869, -1078.4209133992), (83.540642596, -1034.2057645321))
        make_face()
    extrude(amount=-F13_DEPTH, mode=Mode.SUBTRACT)

    # F14 (on face) → F15 (cut)
    with BuildSketch(Plane.XY.offset(25.4)):
        with BuildLine():
            Line((213.370859623, -1126.6048977295), (213.370859623, -1114.9853357906))
            ThreePointArc((213.370859623, -1114.9853357906), (200.773188913, -1110.8213233384), (190.3673261404, -1102.5897787094))
            Line((190.3673261404, -1102.5897787094), (190.3673261404, -969.2397787094))
            ThreePointArc((190.3673261404, -969.2397787094), (200.7161524236, -961.0863132759), (213.2232278912, -956.9450251593))
            Line((213.2232278912, -956.9450251593), (212.9195398237, -945.3366661787))
            ThreePointArc((212.9195398237, -945.3366661787), (201.1512347814, -947.9680613325), (190.3673261404, -953.3647787094))
            Line((190.3673261404, -953.3647787094), (159.8152369261, -953.3647787094))
            Line((159.8152369261, -953.3647787094), (159.8152369261, -1118.3487176895))
            Line((159.8152369261, -1118.3487176895), (190.3673261404, -1118.4647787094))
            ThreePointArc((190.3673261404, -1118.4647787094), (201.3599627311, -1123.9736123253), (213.370859623, -1126.6048977295))
        make_face()
        with BuildLine():
            ThreePointArc((233.0341281328, -1029.9670075356), (227.08706533, -1028.3938294356), (220.990859623, -1027.569984006))
            Line((220.990859623, -1027.569984006), (220.990859623, -1044.0753467383))
            ThreePointArc((220.990859623, -1044.0753467383), (226.9749905665, -1043.3169006739), (232.8225876525, -1041.8368088181))
            ThreePointArc((232.8225876525, -1041.8368088181), (256.4621416526, -1083.337416125), (220.990859623, -1115.3204908886))
            Line((220.990859623, -1115.3204908886), (220.990859623, -1126.7132278679))
            ThreePointArc((220.990859623, -1126.7132278679), (265.7478847903, -1090.0150099575), (245.143692557, -1035.9278787521))
            ThreePointArc((245.143692557, -1035.9278787521), (265.6385890404, -981.8947740671), (220.990859623, -945.2042106805))
            Line((220.990859623, -945.2042106805), (220.990859623, -956.6048305363))
            ThreePointArc((220.990859623, -956.6048305363), (256.3621577318, -988.4678247955), (233.0341281328, -1029.9670075356))
        make_face()
        with BuildLine():
            Line((191.6592419147, -1035.0634215308), (191.6592419147, -1036.7437991805))
            ThreePointArc((191.6592419147, -1036.7437991805), (202.0911371494, -1041.6354927603), (213.370859623, -1043.9851661811))
            Line((213.370859623, -1043.9851661811), (213.370859623, -1027.6066599284))
            ThreePointArc((213.370859623, -1027.6066599284), (202.0728981967, -1030.0476390226), (191.6592419147, -1035.0634215308))
        make_face()
    extrude(amount=-F15_DEPTH, mode=Mode.SUBTRACT)


solid = f1.part
